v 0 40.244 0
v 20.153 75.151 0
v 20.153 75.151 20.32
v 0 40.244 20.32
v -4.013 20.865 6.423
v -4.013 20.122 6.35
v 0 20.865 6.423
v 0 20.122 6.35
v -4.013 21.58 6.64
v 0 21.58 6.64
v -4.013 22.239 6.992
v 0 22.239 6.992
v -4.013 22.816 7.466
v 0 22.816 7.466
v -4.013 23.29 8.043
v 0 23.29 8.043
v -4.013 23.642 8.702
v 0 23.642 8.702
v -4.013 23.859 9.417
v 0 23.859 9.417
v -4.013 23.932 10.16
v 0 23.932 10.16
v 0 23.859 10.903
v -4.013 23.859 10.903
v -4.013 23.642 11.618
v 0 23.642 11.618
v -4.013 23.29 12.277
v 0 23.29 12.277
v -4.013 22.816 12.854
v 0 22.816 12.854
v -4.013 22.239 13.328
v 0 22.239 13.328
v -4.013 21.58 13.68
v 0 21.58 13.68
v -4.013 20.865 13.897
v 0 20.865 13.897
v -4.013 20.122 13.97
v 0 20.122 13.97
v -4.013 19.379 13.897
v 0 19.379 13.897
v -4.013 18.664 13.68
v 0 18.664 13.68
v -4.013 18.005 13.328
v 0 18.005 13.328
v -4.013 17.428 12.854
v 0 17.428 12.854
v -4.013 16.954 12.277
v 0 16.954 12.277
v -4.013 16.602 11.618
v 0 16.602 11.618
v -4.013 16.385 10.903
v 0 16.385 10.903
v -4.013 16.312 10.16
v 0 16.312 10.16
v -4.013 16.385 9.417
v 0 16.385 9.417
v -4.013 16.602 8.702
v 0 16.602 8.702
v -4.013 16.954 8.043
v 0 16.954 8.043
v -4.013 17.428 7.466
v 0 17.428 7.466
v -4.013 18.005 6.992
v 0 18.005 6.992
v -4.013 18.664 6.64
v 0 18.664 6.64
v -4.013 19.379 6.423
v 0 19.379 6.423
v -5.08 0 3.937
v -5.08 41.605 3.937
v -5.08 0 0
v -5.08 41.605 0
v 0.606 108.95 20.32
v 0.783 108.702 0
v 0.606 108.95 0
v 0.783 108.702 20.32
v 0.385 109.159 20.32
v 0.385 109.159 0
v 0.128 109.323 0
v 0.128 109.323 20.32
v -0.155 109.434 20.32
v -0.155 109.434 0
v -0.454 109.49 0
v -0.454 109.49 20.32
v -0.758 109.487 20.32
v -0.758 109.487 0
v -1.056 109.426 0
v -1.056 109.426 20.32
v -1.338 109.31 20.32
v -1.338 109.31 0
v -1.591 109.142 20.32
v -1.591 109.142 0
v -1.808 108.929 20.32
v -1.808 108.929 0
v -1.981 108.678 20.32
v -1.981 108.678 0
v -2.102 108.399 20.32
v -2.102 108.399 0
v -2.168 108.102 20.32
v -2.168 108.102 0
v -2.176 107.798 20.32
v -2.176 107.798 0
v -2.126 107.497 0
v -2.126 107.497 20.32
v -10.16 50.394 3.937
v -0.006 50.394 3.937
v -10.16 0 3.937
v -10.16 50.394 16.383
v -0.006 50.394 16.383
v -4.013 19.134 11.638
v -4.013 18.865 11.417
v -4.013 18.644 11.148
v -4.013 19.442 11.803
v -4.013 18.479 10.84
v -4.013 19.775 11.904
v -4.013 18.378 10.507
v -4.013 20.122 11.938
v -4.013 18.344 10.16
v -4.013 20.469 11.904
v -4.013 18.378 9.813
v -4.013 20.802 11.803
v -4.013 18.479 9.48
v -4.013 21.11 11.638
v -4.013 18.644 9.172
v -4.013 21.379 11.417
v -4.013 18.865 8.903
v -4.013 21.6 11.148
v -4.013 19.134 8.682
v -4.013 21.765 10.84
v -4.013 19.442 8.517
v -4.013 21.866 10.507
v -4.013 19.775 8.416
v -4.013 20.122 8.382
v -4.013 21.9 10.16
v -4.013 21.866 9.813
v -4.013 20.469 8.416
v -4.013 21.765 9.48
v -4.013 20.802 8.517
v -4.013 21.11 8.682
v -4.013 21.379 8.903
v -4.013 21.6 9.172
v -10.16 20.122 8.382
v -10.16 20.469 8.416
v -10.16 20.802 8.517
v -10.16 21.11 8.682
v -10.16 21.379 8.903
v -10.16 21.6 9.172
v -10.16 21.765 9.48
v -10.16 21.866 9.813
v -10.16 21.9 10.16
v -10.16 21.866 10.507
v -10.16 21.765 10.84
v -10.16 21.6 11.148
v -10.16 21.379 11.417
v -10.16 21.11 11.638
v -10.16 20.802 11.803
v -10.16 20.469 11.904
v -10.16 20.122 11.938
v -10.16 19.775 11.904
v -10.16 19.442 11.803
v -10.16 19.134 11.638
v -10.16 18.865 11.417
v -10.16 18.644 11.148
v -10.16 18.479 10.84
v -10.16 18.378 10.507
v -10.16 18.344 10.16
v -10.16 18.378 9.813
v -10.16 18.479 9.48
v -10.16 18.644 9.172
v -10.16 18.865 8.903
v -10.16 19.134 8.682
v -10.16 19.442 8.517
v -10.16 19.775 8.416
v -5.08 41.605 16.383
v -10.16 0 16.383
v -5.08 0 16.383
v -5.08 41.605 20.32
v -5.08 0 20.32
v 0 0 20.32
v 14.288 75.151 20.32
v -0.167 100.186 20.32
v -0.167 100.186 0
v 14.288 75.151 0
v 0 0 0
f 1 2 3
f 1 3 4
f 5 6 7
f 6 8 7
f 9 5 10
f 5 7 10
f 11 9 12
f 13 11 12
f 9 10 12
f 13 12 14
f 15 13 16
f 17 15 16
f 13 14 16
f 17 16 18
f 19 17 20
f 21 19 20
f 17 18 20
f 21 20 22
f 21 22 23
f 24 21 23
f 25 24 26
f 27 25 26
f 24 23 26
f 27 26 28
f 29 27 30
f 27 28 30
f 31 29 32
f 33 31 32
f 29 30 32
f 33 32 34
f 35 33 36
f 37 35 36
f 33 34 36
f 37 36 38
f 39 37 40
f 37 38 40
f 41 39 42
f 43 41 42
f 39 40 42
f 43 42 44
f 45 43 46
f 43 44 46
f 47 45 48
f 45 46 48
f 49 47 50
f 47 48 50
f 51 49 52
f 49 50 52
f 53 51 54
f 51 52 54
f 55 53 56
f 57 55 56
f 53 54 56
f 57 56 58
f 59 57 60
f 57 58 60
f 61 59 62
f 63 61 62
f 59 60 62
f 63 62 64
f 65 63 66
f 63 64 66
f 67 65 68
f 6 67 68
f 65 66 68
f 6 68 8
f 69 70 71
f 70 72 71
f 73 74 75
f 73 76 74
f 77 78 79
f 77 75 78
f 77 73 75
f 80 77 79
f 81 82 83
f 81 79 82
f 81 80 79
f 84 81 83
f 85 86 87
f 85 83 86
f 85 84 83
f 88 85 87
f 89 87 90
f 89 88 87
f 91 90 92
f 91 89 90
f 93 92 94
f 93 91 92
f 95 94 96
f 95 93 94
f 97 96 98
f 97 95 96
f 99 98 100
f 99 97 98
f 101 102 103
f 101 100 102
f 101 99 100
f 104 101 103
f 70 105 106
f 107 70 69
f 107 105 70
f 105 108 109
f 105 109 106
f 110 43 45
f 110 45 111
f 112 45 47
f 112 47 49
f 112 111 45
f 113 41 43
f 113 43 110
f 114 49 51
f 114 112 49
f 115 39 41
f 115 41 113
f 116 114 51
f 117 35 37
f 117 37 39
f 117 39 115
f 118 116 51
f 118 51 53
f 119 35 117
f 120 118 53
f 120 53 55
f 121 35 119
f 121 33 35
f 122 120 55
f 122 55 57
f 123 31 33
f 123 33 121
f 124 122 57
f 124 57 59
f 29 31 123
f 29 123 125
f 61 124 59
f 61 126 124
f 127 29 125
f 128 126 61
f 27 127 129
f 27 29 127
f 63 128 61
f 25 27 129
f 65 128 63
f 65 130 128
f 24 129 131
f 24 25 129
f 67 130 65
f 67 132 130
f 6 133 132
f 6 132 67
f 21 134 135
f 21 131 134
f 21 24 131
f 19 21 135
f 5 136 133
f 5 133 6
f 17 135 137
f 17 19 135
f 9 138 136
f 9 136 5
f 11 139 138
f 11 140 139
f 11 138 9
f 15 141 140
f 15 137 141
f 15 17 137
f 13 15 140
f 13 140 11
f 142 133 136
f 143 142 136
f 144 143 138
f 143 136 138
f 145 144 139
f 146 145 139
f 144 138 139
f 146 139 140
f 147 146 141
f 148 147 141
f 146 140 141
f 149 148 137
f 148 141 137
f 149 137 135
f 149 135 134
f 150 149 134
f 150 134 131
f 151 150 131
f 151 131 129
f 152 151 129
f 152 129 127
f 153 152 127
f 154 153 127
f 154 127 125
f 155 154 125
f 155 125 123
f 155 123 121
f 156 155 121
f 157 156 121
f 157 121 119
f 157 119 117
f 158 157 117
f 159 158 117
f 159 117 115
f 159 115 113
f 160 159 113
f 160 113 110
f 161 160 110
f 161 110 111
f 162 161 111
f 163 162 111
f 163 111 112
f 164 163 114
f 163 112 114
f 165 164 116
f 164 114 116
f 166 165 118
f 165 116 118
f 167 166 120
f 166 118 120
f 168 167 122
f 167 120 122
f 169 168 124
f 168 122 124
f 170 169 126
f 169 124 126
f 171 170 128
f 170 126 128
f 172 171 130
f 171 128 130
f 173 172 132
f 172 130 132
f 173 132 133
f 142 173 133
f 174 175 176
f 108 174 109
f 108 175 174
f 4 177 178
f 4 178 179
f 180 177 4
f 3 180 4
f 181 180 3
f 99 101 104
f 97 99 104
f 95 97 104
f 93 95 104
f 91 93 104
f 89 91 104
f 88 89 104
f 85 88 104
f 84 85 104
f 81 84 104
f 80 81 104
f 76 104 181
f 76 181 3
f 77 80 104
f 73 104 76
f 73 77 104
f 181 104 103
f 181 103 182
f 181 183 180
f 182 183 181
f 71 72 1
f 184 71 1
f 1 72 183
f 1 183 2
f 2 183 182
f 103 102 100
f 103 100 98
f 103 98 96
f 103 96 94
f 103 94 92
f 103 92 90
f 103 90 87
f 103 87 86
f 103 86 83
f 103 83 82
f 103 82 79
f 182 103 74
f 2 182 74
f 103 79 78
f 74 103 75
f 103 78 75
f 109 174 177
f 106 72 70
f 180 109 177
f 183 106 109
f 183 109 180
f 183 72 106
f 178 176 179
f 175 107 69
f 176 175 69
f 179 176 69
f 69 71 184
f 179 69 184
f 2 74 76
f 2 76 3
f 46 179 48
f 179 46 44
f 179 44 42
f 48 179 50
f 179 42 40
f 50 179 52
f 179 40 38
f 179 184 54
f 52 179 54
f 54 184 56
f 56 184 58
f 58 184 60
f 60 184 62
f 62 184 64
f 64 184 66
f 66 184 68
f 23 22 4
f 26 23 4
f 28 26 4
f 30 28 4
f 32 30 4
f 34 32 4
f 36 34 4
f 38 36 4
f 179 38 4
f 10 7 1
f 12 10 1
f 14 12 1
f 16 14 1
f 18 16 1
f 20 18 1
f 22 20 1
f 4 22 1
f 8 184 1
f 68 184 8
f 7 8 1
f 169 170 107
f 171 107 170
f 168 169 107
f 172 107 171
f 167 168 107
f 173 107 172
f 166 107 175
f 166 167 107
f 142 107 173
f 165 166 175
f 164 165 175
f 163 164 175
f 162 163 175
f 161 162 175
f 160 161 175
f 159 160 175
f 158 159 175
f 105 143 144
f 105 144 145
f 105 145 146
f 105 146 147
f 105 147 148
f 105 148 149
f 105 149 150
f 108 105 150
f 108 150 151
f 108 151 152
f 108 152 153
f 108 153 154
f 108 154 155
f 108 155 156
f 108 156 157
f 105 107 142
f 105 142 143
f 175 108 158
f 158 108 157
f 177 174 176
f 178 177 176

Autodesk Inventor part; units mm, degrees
ref_plane "YZ Plane" through (0, 0, 0) normal (1, 0, 0) x (0, 1, 0)
ref_plane "XZ Plane" through (0, 0, 0) normal (0, 1, 0) x (-1, 0, 0)
ref_plane "XY Plane" through (0, 0, 0) normal (0, 0, 1) x (1, 0, 0)
sketch "Sketch1" plane through (0, 0, 0) normal (0, 0, 1) x (1, 0, 0)
  line L0 (0, 0) -> (0, 40.244)
  line L1 (-5.08, 41.6052) -> (-5.08, 0)
  line L2 (-5.08, 0) -> (0, 0)
  line L3 (-5.08, 41.6052) -> (14.2875, 75.1507)
  line L4 (14.2875, 75.1507) -> (-9.646, 116.6048)
  line L5 (-9.646, 116.6048) -> (-5.2466, 119.1448)
  line L6 (-5.2466, 119.1448) -> (20.1534, 75.1507)
  line L7 (20.1534, 75.1507) -> (0, 40.244)
  line L8 (-5.2466, 119.1448) -> (-0.1666, 100.186)
  dimension "d0" = 41.6052
  dimension "d1" = 5.08
  dimension "d6" = 5.08
  dimension "d7" = 5.08
  dimension "d8" = 30
  dimension "d10" = 120
  dimension "d11" = 50.8
  dimension "d12" = 38.735
  dimension "d13" = 15
extrude "Extrusion1" add sketch "Sketch1" along normal blind 20.32 contours L2 L1 L3 L4 L8 L6 L7 L0
fillet "Fillet1" radius 1.5875 1 edges at (-5.2466, 119.1448, 10.16)
ref_plane "Work Plane1" through (-10.16, 0, 0) normal (-1, 0, 0) x (0, 0, 1)
sketch "Sketch2" plane through (-10.16, 0, 0) normal (-1, 0, 0) x (0, 0, 1)
  line L0 (0, 0) -> (20.32, 0) projected
  line L1 (3.937, 0) -> (16.383, 0)
  line L2 (16.383, 0) -> (16.383, 50.3936)
  line L3 (16.383, 50.3936) -> (3.937, 50.3936)
  line L4 (3.937, 50.3936) -> (3.937, 0)
  point P0 (10.16, 0)
  dimension "d16" = 12.446
  dimension "d17" = 50.3936
  dimension "d18" = 6.223
extrude "Extrusion2" add sketch "Sketch2" against normal up to next
sketch "Sketch3" plane through (0, 0, 0) normal (1, 0, 0) x (0, 0, -1)
  circle A0 centre (-10.16, 20.122) radius 1.778
  line L0 (0, 0) -> (0, 40.244) projected
  line L1 (0, 0) -> (-20.32, 0) projected
  point P0 (0, 20.122)
  point P1 (-10.16, 0)
  dimension "d21" = 3.556
extrude "Extrusion3" cut sketch "Sketch3" against normal blind 25.4
sketch "Sketch4" plane through (0, 0, 0) normal (1, 0, 0) x (0, 0, -1)
  circle A0 centre (-10.16, 20.122) radius 1.778 projected
  circle A1 centre (-10.16, 20.122) radius 3.81
  point P0 (0, 0)
  dimension "d24" = 7.62
extrude "Extrusion4" cut sketch "Sketch4" against normal blind 4.0132
equation "\"d18\" = 0.5 * d16"
properties part number "KNUCKLE 2"
